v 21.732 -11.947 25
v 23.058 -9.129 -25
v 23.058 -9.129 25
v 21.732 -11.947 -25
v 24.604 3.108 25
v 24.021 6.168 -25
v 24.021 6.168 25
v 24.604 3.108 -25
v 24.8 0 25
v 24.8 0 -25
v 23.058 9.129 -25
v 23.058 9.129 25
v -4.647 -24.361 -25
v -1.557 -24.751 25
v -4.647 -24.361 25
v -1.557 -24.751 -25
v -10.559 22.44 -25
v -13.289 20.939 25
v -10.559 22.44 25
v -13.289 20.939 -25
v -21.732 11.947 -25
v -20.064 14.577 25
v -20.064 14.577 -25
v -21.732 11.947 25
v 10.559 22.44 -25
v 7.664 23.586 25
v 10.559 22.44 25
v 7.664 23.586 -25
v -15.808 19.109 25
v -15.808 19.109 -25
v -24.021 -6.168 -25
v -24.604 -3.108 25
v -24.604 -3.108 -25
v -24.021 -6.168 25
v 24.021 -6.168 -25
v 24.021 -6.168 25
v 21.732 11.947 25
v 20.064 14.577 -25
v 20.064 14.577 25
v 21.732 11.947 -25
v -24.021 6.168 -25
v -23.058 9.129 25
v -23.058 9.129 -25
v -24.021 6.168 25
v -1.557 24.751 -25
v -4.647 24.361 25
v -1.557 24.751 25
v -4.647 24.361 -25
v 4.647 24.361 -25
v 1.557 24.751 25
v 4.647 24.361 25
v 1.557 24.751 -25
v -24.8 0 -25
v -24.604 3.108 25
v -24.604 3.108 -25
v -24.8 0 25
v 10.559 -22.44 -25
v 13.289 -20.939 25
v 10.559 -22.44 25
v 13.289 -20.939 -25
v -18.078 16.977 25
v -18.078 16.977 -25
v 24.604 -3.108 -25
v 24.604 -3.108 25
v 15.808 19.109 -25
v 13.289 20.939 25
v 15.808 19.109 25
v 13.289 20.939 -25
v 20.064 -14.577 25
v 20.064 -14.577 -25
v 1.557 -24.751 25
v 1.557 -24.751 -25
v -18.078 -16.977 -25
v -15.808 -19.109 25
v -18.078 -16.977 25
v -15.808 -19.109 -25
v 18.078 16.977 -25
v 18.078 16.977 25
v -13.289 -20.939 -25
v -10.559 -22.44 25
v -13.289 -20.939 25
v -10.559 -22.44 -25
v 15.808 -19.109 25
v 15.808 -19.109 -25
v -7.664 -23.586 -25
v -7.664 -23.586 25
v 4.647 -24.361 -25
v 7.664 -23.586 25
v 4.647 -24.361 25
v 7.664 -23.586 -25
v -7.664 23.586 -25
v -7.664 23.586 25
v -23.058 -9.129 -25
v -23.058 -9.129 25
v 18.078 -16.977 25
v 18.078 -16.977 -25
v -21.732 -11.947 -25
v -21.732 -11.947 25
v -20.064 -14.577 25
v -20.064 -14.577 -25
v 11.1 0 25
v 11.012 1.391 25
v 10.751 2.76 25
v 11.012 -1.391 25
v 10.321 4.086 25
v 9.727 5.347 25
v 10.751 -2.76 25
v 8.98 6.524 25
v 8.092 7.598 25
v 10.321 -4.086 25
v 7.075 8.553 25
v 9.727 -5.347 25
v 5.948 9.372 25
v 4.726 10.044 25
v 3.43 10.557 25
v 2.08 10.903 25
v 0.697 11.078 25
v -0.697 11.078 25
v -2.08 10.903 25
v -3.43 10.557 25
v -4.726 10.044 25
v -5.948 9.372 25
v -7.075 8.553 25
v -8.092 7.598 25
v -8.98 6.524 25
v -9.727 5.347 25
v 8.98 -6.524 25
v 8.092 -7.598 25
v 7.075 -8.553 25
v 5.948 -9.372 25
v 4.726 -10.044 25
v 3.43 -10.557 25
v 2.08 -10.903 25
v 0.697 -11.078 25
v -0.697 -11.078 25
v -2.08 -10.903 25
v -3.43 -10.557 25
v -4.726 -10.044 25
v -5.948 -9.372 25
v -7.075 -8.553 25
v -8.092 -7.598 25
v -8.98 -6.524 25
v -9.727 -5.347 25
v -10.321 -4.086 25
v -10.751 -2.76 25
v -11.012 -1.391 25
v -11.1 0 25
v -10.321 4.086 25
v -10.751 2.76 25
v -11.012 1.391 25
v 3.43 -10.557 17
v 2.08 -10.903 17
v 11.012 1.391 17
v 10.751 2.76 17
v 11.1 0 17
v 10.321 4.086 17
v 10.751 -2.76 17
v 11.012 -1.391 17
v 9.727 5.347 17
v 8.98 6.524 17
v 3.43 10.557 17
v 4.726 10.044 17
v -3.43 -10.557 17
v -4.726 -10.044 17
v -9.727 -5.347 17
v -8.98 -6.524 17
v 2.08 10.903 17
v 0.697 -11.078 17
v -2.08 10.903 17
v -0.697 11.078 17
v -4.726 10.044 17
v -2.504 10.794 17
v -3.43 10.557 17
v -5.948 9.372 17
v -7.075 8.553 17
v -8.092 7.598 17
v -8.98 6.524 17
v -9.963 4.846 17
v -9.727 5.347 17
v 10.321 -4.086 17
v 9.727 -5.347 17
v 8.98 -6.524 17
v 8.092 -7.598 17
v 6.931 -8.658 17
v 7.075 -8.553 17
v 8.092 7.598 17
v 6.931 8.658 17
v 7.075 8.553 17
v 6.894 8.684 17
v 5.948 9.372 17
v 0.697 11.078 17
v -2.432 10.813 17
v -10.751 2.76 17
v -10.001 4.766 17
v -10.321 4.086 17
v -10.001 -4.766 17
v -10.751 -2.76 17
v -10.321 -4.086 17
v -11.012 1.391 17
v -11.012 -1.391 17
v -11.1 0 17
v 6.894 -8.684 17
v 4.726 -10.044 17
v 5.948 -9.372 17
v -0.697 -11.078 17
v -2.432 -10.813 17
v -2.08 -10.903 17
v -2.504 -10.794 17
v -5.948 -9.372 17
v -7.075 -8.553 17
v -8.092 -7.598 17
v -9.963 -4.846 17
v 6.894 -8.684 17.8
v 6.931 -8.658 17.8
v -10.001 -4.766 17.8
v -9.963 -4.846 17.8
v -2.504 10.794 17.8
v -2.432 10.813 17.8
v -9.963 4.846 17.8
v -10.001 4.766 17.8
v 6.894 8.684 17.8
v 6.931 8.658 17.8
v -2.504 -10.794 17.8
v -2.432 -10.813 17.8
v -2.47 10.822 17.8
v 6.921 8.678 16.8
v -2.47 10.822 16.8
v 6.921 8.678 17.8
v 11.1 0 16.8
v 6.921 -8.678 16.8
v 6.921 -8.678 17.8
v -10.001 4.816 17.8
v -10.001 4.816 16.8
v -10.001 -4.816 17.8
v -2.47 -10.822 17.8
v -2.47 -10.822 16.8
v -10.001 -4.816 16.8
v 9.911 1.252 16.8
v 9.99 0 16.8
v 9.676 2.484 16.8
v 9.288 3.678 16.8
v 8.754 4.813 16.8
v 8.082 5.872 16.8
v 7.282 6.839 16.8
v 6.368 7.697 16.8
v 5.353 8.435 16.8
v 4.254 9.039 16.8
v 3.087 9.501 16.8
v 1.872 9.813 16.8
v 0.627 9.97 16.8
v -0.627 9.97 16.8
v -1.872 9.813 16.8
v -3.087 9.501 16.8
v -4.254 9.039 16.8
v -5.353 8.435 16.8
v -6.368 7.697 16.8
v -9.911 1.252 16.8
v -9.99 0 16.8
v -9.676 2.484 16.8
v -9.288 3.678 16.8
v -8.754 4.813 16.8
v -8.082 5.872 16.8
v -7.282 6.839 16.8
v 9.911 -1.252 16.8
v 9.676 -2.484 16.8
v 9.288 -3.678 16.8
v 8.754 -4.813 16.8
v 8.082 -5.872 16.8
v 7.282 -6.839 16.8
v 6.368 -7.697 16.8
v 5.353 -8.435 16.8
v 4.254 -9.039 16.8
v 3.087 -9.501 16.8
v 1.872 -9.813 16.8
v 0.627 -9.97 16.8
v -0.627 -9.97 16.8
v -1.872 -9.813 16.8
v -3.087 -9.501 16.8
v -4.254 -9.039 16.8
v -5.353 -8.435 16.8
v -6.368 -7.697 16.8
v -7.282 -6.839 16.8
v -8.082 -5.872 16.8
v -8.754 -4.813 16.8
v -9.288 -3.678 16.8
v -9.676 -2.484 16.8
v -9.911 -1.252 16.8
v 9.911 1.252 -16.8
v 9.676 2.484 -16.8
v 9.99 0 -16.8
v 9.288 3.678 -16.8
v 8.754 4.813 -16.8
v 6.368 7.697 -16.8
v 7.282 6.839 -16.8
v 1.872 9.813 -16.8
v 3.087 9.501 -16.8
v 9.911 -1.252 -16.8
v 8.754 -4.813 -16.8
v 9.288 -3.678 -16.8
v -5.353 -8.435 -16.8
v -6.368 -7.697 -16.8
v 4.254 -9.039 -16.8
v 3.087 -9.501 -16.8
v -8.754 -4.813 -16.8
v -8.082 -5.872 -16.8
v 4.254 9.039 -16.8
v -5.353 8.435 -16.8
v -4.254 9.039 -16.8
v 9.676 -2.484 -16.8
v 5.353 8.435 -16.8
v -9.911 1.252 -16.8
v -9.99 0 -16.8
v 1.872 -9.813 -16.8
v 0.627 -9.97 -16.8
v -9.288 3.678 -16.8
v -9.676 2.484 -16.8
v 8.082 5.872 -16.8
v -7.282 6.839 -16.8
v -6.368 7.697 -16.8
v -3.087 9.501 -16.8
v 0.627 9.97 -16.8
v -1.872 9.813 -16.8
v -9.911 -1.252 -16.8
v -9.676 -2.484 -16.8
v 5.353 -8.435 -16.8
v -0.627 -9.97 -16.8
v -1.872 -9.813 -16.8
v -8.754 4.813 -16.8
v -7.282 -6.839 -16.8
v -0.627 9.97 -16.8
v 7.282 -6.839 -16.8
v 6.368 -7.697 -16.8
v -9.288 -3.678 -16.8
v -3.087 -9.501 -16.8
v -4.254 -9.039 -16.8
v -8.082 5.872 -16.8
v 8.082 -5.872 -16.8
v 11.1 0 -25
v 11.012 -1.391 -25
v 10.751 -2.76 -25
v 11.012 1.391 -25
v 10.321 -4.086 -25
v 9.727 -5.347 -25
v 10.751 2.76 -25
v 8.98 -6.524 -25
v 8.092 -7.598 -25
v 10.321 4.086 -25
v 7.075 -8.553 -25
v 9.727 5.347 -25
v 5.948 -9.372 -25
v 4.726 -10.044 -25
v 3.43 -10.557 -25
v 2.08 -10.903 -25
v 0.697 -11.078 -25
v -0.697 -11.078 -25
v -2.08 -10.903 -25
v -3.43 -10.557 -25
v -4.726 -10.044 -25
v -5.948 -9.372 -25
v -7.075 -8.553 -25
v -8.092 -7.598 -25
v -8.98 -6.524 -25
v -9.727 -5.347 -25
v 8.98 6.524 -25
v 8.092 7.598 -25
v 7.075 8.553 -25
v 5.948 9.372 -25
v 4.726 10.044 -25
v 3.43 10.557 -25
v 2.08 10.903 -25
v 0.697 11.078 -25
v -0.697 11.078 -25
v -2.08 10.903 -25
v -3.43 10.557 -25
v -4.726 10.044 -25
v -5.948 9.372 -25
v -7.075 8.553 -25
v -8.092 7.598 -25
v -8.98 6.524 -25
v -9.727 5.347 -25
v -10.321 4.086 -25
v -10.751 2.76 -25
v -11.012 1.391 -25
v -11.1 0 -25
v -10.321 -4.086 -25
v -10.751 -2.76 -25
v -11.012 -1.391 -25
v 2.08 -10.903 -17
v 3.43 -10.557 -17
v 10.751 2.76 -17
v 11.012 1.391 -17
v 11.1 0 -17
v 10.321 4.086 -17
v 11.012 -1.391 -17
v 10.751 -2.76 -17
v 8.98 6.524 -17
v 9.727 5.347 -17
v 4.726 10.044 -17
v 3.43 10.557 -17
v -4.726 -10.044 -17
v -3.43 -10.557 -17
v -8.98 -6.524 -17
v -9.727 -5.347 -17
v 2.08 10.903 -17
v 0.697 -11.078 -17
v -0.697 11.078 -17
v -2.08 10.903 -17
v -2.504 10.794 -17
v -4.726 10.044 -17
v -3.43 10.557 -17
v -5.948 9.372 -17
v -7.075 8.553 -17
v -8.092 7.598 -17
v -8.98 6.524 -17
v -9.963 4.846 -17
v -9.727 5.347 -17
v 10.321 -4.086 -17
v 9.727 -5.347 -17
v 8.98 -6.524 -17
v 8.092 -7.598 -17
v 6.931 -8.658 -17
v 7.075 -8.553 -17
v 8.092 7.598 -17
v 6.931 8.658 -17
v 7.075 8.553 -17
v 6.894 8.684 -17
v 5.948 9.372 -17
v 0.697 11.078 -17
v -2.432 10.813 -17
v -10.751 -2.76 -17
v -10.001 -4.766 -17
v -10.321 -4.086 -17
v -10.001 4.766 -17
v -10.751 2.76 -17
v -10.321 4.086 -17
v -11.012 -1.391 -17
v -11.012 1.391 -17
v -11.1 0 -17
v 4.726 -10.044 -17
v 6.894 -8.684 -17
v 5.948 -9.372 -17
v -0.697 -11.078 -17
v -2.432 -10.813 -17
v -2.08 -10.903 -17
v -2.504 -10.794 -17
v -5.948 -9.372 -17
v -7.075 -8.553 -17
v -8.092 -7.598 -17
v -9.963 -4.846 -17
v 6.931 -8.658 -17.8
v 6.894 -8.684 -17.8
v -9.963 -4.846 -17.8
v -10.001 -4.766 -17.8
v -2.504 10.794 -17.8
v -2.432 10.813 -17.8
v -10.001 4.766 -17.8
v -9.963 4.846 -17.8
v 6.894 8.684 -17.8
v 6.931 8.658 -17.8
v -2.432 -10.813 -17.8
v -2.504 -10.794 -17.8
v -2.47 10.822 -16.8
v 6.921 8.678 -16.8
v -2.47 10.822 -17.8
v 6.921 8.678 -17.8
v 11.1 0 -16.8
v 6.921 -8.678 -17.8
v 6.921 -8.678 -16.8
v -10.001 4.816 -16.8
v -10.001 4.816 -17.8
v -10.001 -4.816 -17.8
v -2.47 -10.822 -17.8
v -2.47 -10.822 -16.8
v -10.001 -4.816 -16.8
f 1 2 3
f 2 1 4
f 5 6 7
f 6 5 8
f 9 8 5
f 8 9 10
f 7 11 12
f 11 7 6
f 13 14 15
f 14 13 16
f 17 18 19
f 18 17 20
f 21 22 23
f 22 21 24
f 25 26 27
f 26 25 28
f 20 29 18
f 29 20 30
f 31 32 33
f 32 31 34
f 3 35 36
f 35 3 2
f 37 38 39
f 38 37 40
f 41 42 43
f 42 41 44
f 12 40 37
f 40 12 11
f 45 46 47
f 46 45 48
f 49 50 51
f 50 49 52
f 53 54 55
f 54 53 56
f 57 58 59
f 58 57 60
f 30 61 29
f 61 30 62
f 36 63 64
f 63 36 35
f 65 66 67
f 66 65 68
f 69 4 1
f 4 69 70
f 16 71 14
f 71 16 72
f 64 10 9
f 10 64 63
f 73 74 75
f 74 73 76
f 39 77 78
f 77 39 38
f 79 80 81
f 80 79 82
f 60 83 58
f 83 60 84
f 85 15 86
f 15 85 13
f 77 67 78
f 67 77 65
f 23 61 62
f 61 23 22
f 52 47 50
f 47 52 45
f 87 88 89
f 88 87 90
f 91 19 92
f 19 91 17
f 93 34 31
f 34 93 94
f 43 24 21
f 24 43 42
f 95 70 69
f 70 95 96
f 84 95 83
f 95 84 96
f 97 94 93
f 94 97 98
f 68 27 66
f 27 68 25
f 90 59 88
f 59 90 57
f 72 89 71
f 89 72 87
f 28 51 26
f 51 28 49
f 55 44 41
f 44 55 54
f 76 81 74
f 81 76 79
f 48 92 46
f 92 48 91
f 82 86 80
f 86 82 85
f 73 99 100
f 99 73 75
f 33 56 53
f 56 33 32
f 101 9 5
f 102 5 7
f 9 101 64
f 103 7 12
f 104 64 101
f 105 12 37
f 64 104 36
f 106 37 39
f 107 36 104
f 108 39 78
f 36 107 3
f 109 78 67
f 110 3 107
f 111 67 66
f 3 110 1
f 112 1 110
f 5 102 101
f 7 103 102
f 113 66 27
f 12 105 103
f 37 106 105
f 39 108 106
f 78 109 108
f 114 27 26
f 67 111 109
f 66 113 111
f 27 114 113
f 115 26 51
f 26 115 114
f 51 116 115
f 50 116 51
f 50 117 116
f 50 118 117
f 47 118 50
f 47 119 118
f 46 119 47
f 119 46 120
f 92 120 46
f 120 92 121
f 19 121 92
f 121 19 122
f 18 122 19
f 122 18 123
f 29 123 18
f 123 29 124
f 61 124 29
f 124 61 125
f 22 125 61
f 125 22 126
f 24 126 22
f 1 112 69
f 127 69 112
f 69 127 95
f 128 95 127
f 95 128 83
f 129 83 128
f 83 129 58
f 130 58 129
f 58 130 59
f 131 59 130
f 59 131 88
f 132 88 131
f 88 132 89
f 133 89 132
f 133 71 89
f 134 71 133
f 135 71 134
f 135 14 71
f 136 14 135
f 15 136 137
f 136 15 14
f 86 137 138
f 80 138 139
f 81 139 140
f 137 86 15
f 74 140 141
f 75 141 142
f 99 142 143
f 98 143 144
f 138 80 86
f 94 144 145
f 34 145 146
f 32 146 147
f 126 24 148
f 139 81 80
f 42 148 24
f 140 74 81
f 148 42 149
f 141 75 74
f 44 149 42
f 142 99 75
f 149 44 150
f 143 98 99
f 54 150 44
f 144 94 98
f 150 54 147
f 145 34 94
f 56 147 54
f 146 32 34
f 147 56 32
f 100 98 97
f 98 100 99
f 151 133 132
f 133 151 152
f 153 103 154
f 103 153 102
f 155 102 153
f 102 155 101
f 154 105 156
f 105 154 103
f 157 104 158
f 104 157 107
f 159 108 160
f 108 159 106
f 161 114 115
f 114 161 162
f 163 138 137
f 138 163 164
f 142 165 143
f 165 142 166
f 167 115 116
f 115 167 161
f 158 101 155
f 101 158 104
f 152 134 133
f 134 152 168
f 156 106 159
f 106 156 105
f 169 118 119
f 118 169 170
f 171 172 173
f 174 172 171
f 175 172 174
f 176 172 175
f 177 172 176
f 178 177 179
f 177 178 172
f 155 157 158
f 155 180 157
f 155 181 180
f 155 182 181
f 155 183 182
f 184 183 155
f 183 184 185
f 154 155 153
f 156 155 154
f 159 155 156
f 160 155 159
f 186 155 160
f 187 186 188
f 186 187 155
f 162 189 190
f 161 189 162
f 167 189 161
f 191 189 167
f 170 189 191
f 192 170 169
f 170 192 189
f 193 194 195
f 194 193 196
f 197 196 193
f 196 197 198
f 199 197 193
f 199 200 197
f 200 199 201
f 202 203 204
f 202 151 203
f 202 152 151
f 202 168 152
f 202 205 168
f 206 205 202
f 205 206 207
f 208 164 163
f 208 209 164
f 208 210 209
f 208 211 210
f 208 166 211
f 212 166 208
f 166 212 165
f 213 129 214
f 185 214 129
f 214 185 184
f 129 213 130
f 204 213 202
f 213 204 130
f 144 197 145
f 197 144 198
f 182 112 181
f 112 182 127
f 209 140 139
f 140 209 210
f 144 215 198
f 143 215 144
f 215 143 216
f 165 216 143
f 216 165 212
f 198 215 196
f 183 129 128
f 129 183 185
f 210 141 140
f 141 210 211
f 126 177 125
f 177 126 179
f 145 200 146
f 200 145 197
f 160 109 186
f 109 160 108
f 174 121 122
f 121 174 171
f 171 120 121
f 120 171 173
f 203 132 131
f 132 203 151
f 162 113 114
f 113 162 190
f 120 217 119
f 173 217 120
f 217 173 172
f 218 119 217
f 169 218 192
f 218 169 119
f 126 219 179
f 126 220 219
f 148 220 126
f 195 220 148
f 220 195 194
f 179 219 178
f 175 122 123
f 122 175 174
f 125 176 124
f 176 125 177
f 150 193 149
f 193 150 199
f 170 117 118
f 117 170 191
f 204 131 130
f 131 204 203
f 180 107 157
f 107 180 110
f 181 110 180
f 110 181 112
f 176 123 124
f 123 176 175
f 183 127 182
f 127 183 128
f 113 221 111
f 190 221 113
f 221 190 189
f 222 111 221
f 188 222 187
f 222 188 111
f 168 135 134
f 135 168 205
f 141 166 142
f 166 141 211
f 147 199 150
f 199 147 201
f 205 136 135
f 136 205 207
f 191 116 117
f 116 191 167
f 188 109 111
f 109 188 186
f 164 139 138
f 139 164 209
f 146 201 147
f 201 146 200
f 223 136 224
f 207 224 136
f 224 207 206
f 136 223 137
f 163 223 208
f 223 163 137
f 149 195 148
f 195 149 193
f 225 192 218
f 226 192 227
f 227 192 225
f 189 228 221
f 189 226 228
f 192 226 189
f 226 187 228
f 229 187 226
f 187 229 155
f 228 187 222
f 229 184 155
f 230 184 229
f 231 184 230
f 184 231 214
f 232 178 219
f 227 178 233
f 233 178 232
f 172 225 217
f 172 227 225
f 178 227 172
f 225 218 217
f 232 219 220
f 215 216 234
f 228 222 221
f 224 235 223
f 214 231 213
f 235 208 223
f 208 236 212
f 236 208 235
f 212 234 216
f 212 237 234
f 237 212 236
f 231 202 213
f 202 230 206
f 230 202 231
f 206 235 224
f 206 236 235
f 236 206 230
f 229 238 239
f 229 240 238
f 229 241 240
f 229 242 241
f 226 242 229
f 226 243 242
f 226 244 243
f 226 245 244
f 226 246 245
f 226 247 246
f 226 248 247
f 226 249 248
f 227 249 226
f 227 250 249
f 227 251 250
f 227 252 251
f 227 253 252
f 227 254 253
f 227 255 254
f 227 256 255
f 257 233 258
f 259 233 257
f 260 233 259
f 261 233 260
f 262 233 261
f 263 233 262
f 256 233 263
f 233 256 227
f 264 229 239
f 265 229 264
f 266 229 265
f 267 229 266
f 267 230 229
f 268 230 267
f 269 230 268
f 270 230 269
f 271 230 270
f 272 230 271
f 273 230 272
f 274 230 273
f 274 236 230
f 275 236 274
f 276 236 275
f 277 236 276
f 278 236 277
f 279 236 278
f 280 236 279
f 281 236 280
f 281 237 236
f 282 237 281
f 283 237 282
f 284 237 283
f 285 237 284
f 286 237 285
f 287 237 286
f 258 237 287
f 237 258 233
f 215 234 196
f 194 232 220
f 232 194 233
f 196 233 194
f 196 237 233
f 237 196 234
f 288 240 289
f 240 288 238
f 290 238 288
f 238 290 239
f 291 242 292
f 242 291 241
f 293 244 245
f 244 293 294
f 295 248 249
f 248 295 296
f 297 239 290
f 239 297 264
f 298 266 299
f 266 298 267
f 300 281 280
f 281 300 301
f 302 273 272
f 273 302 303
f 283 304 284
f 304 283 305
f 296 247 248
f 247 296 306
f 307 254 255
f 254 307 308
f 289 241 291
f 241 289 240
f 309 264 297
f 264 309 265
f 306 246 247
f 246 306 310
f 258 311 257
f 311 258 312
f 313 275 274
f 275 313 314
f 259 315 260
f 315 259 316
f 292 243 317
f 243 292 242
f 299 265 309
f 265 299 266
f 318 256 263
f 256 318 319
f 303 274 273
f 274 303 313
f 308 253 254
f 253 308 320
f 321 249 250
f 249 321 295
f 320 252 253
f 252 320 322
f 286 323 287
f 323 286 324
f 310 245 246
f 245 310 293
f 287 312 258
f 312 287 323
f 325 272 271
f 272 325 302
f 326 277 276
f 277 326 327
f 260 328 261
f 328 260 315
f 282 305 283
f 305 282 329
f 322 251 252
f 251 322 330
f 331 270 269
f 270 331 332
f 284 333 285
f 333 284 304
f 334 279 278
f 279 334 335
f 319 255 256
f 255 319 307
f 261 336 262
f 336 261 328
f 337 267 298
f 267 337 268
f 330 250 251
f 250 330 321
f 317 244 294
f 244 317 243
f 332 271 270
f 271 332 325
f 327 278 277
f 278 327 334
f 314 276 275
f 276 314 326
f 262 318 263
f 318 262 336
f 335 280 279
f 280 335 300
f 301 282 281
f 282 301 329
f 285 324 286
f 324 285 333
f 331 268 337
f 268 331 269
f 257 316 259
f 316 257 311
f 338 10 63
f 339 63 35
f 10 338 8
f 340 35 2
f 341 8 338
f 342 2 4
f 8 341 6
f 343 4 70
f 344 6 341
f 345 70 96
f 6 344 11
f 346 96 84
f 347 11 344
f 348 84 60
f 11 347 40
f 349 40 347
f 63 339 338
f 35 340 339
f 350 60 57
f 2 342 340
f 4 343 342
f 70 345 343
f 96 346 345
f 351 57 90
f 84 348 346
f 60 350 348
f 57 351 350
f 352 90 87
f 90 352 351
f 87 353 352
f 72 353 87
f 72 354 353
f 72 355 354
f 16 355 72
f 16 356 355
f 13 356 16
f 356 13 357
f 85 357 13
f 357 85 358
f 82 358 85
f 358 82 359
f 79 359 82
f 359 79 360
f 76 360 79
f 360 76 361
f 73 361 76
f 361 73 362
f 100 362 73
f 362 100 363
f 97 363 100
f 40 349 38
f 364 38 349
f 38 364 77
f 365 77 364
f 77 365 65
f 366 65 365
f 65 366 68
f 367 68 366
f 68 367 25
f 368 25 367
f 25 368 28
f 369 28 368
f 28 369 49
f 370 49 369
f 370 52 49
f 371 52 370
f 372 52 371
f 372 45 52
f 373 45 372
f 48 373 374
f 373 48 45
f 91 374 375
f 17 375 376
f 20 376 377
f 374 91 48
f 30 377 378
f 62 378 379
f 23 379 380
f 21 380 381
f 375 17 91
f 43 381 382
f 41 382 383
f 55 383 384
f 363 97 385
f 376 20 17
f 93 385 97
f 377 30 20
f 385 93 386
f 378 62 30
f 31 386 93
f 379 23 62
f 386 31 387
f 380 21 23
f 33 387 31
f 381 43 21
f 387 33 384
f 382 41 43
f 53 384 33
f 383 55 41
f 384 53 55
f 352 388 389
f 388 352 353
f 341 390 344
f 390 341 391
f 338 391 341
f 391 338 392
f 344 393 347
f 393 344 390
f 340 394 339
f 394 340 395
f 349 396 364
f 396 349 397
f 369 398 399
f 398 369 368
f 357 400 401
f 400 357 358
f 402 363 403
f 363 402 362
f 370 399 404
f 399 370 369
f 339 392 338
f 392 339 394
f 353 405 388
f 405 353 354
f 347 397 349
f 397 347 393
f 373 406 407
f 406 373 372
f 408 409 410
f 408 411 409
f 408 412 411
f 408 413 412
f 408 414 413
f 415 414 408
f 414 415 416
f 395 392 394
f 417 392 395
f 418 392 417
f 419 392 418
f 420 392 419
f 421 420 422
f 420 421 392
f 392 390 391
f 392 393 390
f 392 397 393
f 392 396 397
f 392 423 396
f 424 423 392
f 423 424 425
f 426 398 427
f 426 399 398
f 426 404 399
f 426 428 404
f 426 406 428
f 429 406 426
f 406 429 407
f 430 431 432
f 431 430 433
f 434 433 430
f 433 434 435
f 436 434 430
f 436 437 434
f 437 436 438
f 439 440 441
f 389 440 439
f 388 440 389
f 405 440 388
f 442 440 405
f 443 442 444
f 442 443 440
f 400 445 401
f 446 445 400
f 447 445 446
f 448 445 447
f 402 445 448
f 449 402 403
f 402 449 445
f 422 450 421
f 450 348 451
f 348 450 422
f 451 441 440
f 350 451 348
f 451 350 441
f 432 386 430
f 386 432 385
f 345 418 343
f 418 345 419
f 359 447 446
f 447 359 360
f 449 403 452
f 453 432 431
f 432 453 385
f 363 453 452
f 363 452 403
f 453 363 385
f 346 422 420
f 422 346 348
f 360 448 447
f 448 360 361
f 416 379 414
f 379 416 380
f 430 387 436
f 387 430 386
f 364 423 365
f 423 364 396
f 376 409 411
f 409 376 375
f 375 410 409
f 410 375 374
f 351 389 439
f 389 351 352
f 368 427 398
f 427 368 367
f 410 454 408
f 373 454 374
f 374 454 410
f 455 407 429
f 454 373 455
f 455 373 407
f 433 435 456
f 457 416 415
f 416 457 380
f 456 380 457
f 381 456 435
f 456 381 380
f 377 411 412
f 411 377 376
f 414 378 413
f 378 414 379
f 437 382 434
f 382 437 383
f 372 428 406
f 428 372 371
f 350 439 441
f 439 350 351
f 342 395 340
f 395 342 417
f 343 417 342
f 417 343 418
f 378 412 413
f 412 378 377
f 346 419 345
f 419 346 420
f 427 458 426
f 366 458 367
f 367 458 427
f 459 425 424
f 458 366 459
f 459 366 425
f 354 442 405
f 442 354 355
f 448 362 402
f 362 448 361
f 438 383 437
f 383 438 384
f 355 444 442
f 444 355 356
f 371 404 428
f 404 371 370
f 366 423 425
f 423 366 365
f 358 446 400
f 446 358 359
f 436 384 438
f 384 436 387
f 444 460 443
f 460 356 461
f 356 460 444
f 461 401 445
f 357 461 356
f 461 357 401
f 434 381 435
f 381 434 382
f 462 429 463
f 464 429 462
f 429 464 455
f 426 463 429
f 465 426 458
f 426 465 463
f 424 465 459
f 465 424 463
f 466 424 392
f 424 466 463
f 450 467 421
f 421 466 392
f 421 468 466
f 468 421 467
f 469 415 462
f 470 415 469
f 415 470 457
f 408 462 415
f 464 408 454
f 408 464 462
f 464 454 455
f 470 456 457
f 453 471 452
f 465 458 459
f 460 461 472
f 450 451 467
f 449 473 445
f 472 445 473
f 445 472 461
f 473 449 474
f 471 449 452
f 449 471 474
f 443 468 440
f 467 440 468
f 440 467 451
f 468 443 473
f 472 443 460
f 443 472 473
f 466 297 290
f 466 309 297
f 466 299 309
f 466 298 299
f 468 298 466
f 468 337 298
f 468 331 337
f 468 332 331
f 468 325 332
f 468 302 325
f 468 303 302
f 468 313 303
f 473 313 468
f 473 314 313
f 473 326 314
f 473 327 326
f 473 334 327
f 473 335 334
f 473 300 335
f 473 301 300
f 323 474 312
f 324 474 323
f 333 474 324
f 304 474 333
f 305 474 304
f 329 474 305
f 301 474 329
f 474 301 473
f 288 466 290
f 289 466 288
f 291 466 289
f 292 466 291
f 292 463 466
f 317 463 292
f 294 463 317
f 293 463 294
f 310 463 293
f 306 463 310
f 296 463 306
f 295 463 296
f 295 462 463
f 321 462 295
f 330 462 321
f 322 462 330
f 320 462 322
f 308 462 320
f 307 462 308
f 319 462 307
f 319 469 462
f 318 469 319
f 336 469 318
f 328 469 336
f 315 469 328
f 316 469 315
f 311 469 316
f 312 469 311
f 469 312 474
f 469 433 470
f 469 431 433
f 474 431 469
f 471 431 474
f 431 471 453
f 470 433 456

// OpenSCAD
// Customizable hub for spool holder
// Vincent Groenhuis

// Nov 9, 2018: Spool diameter can now be customized; a rim connects to the spring
// Nov 7, 2018: Original version

spool_diameter = 49.6;

// Leave at 49.6 to match the spring
rim_diameter = 49.6;

// For taping to the spring
rim_width = 10;

// Total width of the hub (including rim)
hub_width = 50;

bearing_diameter = 22.2;

bearing_width = 8;

// Circle rendering parameter
$fn=50;

intersection(){
    union(){
        half_spool();
        mirror([0,0,1])half_spool();
    }
    union(){
        translate([0,0,-hub_width/2+rim_width])cylinder(d=spool_diameter,h=hub_width-rim_width+1);
        translate([0,0,-hub_width/2-1])cylinder(d=rim_diameter,h=rim_width+1);        
    }
}

module half_spool(){
    difference(){
        cylinder(d=max(spool_diameter,rim_diameter),h=hub_width/2);
        translate([0,0,hub_width/2-bearing_width])cylinder(d=bearing_diameter,h=bearing_width+1);
        translate([0,0,hub_width/2-bearing_width-0.2])cylinder(d=bearing_diameter,h=1,$fn=7);
        translate([0,0,-1])cylinder(d=bearing_diameter-bearing_diameter/10,h=hub_width/2+2);
    }
}
